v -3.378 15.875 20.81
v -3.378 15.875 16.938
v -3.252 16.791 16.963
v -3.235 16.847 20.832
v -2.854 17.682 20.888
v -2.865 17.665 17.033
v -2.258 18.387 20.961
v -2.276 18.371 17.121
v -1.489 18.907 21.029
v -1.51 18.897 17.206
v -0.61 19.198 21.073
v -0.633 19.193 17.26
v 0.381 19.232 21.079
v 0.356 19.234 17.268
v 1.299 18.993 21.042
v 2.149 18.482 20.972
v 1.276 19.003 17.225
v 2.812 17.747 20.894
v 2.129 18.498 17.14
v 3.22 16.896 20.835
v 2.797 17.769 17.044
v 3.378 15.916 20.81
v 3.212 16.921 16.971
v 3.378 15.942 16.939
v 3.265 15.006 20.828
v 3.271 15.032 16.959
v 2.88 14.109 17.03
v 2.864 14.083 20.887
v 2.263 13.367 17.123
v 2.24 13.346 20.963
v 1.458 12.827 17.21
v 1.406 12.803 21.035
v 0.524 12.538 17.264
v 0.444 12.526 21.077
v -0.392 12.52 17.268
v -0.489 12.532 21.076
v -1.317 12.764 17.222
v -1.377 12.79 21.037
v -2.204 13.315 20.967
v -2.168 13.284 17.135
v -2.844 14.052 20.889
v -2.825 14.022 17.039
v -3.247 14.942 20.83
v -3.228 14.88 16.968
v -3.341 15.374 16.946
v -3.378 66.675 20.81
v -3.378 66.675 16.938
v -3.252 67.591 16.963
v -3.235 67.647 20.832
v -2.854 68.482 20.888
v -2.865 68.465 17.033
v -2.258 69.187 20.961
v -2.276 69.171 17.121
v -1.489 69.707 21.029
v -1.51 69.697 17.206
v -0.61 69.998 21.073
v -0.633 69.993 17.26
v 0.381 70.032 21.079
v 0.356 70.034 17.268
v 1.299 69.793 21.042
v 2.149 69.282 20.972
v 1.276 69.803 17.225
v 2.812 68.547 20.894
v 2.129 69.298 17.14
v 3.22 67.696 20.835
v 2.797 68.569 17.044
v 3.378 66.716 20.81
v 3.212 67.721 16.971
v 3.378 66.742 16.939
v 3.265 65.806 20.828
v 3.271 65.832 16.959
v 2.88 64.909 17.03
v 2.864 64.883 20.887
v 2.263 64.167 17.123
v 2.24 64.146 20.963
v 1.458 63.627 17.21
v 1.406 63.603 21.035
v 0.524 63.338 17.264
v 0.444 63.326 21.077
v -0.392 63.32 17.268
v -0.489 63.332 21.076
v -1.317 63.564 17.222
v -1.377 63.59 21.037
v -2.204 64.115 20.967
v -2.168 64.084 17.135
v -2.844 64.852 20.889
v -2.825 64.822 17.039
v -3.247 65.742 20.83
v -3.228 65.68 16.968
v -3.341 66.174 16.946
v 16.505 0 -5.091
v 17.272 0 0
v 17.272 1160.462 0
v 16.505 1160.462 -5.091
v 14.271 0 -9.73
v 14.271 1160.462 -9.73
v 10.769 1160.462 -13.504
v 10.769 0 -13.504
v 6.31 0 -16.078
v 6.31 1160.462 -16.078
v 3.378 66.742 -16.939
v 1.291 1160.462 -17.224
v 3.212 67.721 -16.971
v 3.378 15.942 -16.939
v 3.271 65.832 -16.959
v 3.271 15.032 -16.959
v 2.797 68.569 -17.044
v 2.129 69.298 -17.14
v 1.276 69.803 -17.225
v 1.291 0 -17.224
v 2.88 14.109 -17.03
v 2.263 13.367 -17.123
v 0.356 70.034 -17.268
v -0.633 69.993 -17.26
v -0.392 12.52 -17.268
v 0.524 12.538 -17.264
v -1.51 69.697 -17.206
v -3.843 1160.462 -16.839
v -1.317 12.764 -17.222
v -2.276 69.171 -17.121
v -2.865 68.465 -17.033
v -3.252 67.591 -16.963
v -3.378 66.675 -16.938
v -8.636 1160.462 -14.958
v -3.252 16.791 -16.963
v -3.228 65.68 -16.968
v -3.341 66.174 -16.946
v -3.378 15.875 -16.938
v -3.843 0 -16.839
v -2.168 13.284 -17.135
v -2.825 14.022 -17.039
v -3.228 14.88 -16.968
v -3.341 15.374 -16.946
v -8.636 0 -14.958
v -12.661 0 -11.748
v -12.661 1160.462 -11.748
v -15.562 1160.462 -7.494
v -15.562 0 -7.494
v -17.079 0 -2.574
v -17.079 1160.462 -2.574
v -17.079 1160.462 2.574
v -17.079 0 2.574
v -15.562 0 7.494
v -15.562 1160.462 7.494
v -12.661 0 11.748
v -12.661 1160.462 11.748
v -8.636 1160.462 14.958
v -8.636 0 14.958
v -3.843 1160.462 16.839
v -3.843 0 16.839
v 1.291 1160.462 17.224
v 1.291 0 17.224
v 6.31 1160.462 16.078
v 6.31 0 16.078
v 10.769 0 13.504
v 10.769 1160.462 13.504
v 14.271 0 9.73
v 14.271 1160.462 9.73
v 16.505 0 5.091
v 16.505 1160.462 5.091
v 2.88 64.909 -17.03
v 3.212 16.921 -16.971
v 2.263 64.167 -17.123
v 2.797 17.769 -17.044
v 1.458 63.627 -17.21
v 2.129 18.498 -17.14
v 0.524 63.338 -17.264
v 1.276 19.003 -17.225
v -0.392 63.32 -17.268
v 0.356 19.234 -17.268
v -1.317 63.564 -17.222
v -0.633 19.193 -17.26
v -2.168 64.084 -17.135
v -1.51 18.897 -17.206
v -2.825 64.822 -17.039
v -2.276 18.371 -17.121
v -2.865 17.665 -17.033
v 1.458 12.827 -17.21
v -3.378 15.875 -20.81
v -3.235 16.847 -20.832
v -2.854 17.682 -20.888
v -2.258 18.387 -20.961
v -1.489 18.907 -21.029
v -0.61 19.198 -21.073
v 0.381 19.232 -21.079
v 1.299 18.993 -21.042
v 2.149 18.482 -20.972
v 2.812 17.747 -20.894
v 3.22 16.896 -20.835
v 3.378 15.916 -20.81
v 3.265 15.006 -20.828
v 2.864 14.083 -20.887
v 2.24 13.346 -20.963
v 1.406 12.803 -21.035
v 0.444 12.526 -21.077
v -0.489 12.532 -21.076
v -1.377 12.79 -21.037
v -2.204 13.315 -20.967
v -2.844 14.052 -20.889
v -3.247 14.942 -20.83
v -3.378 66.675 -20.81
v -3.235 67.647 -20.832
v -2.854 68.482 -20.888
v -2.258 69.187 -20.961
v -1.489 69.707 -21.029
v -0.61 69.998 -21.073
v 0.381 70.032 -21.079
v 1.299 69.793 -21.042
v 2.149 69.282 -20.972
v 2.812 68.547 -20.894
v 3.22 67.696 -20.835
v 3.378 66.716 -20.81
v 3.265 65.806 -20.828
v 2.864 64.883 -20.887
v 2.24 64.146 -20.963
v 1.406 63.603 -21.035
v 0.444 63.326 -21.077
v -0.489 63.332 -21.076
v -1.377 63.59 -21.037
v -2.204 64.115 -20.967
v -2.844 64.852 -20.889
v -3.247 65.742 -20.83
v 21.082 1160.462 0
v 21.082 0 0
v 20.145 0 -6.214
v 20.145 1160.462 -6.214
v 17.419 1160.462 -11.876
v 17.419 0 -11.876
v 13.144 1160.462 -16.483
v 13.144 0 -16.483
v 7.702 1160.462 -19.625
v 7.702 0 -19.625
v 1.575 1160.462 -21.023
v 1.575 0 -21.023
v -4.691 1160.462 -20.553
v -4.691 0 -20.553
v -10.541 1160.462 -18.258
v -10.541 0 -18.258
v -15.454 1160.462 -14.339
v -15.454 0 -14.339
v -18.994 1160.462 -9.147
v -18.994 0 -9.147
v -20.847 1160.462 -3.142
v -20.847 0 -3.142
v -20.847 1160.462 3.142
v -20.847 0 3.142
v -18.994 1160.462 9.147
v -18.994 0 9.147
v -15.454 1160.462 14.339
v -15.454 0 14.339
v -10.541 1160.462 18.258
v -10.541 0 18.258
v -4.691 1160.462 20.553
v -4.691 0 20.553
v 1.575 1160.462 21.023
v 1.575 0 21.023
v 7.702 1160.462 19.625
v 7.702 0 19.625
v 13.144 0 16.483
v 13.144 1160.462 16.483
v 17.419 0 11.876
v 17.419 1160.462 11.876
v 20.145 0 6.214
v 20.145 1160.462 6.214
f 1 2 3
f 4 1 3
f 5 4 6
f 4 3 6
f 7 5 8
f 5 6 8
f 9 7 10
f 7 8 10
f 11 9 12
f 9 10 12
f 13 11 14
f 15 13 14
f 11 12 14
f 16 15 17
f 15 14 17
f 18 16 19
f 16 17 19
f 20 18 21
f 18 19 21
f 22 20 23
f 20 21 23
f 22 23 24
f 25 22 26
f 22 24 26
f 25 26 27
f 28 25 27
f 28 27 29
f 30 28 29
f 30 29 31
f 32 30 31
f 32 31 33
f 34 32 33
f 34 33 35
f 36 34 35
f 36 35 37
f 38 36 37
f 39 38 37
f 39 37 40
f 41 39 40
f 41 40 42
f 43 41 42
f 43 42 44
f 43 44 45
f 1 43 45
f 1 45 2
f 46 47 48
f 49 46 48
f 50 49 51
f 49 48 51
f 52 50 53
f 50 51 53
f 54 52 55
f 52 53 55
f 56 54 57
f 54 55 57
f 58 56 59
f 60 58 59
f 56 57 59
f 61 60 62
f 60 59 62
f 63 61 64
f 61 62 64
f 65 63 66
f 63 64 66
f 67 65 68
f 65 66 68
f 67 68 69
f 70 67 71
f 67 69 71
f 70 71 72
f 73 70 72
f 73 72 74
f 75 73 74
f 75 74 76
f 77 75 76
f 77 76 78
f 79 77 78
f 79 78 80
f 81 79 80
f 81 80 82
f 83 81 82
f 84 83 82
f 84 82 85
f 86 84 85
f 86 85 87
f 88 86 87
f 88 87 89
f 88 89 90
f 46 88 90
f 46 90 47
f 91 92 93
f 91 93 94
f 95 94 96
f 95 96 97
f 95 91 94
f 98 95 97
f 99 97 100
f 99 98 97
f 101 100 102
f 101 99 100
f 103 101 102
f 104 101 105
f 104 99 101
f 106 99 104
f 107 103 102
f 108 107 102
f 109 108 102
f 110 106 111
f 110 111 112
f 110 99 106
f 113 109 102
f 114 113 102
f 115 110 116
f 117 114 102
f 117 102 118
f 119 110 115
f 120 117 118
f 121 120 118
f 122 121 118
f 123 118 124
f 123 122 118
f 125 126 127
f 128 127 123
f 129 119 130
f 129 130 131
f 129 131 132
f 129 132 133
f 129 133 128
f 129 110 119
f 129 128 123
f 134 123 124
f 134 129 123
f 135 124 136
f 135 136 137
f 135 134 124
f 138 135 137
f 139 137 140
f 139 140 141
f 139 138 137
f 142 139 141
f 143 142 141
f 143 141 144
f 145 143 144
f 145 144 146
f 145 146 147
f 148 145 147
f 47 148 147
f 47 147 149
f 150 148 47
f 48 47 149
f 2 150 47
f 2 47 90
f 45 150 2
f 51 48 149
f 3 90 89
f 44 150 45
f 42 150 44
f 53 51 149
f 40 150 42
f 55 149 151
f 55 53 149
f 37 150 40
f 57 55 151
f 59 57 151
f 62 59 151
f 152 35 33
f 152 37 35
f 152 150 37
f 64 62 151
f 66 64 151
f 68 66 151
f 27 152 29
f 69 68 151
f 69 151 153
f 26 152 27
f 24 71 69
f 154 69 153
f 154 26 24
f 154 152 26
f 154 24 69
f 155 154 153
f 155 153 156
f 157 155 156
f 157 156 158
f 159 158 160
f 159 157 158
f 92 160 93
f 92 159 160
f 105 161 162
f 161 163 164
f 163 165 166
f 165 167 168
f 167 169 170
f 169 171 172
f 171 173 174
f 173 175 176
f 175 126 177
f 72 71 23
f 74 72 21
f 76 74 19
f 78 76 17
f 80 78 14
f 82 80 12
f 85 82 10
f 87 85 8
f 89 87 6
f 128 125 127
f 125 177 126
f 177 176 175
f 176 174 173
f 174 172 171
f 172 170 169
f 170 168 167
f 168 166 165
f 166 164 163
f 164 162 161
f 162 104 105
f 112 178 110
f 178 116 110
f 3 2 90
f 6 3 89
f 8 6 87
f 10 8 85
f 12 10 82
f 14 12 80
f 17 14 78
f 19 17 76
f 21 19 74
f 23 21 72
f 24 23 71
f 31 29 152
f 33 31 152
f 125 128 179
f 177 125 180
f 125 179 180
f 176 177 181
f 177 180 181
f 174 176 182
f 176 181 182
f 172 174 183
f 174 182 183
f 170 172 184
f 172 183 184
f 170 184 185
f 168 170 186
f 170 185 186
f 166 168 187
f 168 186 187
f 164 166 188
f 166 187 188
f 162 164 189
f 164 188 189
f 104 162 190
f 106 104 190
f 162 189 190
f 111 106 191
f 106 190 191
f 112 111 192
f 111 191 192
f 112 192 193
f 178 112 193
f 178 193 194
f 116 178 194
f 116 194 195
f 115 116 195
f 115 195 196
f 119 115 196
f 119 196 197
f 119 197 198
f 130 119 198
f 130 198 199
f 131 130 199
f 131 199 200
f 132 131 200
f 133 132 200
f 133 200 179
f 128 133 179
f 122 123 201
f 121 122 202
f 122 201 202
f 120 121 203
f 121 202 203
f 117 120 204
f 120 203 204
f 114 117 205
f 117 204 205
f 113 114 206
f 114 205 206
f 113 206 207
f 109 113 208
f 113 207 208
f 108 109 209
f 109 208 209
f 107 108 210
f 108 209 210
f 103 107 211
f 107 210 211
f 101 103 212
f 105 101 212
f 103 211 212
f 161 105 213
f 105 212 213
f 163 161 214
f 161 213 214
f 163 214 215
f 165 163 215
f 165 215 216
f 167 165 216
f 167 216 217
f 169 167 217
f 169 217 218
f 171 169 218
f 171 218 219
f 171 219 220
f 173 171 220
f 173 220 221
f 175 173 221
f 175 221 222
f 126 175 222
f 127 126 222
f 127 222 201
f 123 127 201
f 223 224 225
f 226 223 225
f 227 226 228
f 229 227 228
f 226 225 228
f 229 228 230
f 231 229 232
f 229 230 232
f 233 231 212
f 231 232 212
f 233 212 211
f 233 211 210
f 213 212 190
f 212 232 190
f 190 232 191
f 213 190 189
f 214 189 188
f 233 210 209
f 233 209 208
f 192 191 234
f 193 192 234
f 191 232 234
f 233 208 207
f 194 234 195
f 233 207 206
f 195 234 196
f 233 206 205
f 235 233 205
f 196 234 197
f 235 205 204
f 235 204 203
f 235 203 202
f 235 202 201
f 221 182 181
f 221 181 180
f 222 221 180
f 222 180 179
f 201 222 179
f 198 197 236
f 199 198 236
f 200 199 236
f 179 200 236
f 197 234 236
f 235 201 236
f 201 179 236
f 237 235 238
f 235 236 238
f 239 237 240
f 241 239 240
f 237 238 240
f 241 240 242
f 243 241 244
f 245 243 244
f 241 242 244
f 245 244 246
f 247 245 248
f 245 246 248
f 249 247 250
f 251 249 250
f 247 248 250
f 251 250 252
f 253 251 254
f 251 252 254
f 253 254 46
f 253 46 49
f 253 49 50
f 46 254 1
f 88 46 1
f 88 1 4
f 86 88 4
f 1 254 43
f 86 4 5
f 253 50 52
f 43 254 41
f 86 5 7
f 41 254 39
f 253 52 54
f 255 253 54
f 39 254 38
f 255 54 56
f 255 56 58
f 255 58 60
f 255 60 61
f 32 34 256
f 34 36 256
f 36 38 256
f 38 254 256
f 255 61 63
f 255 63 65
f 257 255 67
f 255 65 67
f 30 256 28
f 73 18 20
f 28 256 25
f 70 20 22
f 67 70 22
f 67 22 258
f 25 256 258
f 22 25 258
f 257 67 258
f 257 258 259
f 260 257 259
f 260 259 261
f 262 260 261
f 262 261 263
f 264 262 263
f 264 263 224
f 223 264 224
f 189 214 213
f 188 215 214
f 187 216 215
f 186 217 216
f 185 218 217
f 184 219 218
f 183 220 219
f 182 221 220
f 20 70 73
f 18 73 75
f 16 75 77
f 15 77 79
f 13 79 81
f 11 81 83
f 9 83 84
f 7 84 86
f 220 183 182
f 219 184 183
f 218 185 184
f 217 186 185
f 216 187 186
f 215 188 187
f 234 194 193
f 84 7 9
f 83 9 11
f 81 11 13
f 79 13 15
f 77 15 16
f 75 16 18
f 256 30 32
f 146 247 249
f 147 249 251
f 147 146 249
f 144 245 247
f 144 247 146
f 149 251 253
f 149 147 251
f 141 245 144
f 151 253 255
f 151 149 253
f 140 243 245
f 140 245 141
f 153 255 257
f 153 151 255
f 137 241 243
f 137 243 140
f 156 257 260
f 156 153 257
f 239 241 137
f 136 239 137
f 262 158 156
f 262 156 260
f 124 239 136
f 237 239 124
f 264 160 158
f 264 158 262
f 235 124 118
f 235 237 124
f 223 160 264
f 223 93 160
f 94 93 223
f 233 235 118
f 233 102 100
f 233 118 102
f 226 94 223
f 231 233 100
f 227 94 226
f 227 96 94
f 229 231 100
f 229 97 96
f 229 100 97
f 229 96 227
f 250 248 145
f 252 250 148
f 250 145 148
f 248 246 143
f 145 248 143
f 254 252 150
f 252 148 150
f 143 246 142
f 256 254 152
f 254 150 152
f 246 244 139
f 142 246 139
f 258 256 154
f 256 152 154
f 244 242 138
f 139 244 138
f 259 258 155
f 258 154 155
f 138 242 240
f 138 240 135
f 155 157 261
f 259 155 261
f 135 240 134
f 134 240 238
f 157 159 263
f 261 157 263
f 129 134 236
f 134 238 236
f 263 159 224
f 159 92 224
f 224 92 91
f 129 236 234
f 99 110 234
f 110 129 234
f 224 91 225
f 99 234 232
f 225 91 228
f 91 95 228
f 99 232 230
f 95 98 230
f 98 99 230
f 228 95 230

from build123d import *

# Parameters (mm, degrees)
SKETCH1_R               = 21.082
SKETCH1_R_2             = 17.272
BOSS_EXTRUDE1_DEPTH     = 1160.4625
F_1_4_CLEARANCE_HOLE1_D = 6.7564


with BuildPart() as part:
    # Sketch1 → Boss-Extrude1 (new body)
    with BuildSketch(Plane(origin=(0, 0, 0), x_dir=(1, 0, 0), z_dir=(0, 1, 0))):
        Circle(SKETCH1_R)
        Circle(SKETCH1_R_2, mode=Mode.SUBTRACT)
    extrude(amount=BOSS_EXTRUDE1_DEPTH)

    # 1/4 Clearance Hole1 (through all)
    with Locations(Plane.XY.offset(21.082)):
        with Locations((0, 15.875), (0, 66.675)):
            Hole(F_1_4_CLEARANCE_HOLE1_D / 2)


solid = part.part
